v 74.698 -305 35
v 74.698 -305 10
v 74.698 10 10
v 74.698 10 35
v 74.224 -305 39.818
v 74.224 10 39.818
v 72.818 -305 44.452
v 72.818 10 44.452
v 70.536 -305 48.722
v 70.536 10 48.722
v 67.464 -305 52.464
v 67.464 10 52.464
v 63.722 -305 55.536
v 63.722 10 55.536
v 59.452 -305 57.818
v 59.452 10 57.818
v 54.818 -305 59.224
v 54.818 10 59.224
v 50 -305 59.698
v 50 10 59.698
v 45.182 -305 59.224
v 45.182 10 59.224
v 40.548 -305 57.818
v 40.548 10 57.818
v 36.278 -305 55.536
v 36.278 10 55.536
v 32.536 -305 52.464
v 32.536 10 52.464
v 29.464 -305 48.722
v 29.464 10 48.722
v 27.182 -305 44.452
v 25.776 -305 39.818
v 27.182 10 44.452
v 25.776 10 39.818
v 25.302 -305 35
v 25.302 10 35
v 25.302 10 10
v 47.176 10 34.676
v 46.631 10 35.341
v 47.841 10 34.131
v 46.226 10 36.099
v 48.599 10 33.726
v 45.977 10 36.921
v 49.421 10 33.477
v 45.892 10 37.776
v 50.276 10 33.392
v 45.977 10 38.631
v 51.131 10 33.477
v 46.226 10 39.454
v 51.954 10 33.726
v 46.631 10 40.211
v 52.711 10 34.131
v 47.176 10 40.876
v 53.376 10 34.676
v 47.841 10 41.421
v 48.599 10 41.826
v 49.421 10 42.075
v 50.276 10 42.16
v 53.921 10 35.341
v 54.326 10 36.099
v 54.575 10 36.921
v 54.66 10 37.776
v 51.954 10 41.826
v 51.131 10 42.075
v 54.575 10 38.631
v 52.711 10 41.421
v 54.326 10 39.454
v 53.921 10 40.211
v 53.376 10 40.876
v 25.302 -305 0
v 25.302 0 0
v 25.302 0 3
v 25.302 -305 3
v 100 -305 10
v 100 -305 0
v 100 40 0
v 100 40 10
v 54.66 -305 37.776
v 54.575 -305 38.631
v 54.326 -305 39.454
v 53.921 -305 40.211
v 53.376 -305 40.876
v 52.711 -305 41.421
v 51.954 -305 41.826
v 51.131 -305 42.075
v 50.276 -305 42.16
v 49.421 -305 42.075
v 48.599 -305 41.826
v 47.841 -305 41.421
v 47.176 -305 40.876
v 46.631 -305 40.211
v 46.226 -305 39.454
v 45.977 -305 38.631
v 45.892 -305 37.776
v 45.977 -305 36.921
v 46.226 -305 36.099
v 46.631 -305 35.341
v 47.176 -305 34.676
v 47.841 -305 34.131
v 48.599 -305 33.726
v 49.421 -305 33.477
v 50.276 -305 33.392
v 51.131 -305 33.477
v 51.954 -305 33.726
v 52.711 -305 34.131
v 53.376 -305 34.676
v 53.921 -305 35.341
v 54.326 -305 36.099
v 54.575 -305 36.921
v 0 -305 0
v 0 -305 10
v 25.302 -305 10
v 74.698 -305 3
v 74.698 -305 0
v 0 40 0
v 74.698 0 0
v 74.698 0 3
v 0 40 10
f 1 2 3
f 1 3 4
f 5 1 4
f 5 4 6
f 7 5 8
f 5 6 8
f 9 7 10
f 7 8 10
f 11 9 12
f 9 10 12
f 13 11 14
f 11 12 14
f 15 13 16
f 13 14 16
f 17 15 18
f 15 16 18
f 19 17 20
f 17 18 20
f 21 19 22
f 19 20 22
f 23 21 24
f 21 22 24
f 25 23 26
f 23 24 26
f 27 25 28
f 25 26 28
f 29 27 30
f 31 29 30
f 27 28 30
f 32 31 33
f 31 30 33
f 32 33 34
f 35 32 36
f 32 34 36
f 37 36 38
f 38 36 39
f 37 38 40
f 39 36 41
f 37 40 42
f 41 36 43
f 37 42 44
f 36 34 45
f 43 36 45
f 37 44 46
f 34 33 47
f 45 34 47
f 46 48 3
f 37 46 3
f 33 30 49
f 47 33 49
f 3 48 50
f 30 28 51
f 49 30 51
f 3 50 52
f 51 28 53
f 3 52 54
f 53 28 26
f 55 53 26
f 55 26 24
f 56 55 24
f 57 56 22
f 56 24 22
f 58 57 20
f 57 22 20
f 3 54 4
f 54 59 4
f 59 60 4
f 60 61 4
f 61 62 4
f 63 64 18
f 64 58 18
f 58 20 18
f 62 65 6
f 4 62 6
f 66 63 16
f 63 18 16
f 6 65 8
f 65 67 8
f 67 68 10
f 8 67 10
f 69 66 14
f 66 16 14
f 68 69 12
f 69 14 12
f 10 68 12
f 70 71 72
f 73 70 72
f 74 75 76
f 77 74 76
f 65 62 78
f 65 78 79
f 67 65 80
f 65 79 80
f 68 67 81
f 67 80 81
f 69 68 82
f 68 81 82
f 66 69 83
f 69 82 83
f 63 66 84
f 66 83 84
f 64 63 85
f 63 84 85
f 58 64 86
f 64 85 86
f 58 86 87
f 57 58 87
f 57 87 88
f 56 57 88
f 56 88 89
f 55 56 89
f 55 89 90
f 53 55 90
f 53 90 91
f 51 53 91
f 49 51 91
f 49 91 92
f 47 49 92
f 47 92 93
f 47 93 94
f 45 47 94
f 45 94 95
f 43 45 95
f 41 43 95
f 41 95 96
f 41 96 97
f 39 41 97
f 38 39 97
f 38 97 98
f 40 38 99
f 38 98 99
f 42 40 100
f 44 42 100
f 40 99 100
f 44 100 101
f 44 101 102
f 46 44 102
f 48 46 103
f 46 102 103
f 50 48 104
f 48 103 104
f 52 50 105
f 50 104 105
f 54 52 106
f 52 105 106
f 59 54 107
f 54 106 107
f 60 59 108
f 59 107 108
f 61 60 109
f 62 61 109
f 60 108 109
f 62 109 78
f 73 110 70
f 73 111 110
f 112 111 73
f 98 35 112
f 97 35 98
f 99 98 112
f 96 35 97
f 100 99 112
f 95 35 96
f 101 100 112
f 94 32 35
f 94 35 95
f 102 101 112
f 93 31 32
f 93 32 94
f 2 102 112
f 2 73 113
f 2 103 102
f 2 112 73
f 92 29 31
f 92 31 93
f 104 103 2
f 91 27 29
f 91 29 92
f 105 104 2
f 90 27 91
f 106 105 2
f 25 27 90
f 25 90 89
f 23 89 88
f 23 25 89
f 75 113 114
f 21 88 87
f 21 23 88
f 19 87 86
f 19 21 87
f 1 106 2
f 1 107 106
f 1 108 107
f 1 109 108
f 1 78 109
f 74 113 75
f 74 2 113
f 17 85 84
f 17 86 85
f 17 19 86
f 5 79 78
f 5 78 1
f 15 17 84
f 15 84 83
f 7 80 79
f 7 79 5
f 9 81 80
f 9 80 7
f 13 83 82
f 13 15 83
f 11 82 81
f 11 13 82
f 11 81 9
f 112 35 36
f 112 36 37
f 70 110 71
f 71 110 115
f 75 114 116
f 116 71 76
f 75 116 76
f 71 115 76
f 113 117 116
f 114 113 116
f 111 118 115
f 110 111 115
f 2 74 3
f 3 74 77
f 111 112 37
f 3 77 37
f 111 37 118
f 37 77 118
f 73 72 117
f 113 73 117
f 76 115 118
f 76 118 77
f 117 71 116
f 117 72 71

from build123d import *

# Parameters (mm, degrees)
F0_W     = 100
F0_H     = 40
F1_DEPTH = 10
F3_DEPTH = 10
F5_DEPTH = 305
F6_R     = 4.383557
F7_DEPTH = 345.001


with BuildPart() as f1:
    # F0 (on Top) → F1 (new body)
    with BuildSketch(Plane.XY):
        with Locations((50, 20)):
            Rectangle(F0_W, F0_H)
    extrude(amount=F1_DEPTH)

    # F2 (on face) → F3 (join)
    with BuildSketch(Plane.XZ):
        with BuildLine():
            Line((25.301725, 35), (25.301725, 0))
            Line((25.301725, 0), (74.698275, 0))
            Line((74.698275, 0), (74.698275, 35))
            ThreePointArc((74.698275, 35), (50, 59.698275), (25.301725, 35))
        make_face()
    extrude(amount=-F3_DEPTH)

    # F4 (on face) → F5 (join)
    with BuildSketch(Plane.XZ):
        with BuildLine():
            Line((0, 0), (25.301725, 0))
            Line((25.301725, 0), (25.301725, 3))
            Line((25.301725, 3), (74.698275, 3))
            Line((74.698275, 3), (74.698275, 0))
            Line((74.698275, 0), (100, 0))
            Line((100, 0), (100, 10))
            Line((100, 10), (74.698275, 10))
            Line((74.698275, 10), (74.698275, 35))
            ThreePointArc((74.698275, 35), (50, 59.698275), (25.301725, 35))
            Line((25.301725, 35), (25.301725, 10))
            Line((25.301725, 10), (0, 10))
            Line((0, 10), (0, 0))
        make_face()
    extrude(amount=F5_DEPTH)

    # F6 (on face) → F7 (cut, through all)
    with BuildSketch(Plane.XZ.offset(305)):
        with Locations((50.276015, 37.776016)):
            Circle(F6_R)
    extrude(amount=-F7_DEPTH, mode=Mode.SUBTRACT)


solid = f1.part
